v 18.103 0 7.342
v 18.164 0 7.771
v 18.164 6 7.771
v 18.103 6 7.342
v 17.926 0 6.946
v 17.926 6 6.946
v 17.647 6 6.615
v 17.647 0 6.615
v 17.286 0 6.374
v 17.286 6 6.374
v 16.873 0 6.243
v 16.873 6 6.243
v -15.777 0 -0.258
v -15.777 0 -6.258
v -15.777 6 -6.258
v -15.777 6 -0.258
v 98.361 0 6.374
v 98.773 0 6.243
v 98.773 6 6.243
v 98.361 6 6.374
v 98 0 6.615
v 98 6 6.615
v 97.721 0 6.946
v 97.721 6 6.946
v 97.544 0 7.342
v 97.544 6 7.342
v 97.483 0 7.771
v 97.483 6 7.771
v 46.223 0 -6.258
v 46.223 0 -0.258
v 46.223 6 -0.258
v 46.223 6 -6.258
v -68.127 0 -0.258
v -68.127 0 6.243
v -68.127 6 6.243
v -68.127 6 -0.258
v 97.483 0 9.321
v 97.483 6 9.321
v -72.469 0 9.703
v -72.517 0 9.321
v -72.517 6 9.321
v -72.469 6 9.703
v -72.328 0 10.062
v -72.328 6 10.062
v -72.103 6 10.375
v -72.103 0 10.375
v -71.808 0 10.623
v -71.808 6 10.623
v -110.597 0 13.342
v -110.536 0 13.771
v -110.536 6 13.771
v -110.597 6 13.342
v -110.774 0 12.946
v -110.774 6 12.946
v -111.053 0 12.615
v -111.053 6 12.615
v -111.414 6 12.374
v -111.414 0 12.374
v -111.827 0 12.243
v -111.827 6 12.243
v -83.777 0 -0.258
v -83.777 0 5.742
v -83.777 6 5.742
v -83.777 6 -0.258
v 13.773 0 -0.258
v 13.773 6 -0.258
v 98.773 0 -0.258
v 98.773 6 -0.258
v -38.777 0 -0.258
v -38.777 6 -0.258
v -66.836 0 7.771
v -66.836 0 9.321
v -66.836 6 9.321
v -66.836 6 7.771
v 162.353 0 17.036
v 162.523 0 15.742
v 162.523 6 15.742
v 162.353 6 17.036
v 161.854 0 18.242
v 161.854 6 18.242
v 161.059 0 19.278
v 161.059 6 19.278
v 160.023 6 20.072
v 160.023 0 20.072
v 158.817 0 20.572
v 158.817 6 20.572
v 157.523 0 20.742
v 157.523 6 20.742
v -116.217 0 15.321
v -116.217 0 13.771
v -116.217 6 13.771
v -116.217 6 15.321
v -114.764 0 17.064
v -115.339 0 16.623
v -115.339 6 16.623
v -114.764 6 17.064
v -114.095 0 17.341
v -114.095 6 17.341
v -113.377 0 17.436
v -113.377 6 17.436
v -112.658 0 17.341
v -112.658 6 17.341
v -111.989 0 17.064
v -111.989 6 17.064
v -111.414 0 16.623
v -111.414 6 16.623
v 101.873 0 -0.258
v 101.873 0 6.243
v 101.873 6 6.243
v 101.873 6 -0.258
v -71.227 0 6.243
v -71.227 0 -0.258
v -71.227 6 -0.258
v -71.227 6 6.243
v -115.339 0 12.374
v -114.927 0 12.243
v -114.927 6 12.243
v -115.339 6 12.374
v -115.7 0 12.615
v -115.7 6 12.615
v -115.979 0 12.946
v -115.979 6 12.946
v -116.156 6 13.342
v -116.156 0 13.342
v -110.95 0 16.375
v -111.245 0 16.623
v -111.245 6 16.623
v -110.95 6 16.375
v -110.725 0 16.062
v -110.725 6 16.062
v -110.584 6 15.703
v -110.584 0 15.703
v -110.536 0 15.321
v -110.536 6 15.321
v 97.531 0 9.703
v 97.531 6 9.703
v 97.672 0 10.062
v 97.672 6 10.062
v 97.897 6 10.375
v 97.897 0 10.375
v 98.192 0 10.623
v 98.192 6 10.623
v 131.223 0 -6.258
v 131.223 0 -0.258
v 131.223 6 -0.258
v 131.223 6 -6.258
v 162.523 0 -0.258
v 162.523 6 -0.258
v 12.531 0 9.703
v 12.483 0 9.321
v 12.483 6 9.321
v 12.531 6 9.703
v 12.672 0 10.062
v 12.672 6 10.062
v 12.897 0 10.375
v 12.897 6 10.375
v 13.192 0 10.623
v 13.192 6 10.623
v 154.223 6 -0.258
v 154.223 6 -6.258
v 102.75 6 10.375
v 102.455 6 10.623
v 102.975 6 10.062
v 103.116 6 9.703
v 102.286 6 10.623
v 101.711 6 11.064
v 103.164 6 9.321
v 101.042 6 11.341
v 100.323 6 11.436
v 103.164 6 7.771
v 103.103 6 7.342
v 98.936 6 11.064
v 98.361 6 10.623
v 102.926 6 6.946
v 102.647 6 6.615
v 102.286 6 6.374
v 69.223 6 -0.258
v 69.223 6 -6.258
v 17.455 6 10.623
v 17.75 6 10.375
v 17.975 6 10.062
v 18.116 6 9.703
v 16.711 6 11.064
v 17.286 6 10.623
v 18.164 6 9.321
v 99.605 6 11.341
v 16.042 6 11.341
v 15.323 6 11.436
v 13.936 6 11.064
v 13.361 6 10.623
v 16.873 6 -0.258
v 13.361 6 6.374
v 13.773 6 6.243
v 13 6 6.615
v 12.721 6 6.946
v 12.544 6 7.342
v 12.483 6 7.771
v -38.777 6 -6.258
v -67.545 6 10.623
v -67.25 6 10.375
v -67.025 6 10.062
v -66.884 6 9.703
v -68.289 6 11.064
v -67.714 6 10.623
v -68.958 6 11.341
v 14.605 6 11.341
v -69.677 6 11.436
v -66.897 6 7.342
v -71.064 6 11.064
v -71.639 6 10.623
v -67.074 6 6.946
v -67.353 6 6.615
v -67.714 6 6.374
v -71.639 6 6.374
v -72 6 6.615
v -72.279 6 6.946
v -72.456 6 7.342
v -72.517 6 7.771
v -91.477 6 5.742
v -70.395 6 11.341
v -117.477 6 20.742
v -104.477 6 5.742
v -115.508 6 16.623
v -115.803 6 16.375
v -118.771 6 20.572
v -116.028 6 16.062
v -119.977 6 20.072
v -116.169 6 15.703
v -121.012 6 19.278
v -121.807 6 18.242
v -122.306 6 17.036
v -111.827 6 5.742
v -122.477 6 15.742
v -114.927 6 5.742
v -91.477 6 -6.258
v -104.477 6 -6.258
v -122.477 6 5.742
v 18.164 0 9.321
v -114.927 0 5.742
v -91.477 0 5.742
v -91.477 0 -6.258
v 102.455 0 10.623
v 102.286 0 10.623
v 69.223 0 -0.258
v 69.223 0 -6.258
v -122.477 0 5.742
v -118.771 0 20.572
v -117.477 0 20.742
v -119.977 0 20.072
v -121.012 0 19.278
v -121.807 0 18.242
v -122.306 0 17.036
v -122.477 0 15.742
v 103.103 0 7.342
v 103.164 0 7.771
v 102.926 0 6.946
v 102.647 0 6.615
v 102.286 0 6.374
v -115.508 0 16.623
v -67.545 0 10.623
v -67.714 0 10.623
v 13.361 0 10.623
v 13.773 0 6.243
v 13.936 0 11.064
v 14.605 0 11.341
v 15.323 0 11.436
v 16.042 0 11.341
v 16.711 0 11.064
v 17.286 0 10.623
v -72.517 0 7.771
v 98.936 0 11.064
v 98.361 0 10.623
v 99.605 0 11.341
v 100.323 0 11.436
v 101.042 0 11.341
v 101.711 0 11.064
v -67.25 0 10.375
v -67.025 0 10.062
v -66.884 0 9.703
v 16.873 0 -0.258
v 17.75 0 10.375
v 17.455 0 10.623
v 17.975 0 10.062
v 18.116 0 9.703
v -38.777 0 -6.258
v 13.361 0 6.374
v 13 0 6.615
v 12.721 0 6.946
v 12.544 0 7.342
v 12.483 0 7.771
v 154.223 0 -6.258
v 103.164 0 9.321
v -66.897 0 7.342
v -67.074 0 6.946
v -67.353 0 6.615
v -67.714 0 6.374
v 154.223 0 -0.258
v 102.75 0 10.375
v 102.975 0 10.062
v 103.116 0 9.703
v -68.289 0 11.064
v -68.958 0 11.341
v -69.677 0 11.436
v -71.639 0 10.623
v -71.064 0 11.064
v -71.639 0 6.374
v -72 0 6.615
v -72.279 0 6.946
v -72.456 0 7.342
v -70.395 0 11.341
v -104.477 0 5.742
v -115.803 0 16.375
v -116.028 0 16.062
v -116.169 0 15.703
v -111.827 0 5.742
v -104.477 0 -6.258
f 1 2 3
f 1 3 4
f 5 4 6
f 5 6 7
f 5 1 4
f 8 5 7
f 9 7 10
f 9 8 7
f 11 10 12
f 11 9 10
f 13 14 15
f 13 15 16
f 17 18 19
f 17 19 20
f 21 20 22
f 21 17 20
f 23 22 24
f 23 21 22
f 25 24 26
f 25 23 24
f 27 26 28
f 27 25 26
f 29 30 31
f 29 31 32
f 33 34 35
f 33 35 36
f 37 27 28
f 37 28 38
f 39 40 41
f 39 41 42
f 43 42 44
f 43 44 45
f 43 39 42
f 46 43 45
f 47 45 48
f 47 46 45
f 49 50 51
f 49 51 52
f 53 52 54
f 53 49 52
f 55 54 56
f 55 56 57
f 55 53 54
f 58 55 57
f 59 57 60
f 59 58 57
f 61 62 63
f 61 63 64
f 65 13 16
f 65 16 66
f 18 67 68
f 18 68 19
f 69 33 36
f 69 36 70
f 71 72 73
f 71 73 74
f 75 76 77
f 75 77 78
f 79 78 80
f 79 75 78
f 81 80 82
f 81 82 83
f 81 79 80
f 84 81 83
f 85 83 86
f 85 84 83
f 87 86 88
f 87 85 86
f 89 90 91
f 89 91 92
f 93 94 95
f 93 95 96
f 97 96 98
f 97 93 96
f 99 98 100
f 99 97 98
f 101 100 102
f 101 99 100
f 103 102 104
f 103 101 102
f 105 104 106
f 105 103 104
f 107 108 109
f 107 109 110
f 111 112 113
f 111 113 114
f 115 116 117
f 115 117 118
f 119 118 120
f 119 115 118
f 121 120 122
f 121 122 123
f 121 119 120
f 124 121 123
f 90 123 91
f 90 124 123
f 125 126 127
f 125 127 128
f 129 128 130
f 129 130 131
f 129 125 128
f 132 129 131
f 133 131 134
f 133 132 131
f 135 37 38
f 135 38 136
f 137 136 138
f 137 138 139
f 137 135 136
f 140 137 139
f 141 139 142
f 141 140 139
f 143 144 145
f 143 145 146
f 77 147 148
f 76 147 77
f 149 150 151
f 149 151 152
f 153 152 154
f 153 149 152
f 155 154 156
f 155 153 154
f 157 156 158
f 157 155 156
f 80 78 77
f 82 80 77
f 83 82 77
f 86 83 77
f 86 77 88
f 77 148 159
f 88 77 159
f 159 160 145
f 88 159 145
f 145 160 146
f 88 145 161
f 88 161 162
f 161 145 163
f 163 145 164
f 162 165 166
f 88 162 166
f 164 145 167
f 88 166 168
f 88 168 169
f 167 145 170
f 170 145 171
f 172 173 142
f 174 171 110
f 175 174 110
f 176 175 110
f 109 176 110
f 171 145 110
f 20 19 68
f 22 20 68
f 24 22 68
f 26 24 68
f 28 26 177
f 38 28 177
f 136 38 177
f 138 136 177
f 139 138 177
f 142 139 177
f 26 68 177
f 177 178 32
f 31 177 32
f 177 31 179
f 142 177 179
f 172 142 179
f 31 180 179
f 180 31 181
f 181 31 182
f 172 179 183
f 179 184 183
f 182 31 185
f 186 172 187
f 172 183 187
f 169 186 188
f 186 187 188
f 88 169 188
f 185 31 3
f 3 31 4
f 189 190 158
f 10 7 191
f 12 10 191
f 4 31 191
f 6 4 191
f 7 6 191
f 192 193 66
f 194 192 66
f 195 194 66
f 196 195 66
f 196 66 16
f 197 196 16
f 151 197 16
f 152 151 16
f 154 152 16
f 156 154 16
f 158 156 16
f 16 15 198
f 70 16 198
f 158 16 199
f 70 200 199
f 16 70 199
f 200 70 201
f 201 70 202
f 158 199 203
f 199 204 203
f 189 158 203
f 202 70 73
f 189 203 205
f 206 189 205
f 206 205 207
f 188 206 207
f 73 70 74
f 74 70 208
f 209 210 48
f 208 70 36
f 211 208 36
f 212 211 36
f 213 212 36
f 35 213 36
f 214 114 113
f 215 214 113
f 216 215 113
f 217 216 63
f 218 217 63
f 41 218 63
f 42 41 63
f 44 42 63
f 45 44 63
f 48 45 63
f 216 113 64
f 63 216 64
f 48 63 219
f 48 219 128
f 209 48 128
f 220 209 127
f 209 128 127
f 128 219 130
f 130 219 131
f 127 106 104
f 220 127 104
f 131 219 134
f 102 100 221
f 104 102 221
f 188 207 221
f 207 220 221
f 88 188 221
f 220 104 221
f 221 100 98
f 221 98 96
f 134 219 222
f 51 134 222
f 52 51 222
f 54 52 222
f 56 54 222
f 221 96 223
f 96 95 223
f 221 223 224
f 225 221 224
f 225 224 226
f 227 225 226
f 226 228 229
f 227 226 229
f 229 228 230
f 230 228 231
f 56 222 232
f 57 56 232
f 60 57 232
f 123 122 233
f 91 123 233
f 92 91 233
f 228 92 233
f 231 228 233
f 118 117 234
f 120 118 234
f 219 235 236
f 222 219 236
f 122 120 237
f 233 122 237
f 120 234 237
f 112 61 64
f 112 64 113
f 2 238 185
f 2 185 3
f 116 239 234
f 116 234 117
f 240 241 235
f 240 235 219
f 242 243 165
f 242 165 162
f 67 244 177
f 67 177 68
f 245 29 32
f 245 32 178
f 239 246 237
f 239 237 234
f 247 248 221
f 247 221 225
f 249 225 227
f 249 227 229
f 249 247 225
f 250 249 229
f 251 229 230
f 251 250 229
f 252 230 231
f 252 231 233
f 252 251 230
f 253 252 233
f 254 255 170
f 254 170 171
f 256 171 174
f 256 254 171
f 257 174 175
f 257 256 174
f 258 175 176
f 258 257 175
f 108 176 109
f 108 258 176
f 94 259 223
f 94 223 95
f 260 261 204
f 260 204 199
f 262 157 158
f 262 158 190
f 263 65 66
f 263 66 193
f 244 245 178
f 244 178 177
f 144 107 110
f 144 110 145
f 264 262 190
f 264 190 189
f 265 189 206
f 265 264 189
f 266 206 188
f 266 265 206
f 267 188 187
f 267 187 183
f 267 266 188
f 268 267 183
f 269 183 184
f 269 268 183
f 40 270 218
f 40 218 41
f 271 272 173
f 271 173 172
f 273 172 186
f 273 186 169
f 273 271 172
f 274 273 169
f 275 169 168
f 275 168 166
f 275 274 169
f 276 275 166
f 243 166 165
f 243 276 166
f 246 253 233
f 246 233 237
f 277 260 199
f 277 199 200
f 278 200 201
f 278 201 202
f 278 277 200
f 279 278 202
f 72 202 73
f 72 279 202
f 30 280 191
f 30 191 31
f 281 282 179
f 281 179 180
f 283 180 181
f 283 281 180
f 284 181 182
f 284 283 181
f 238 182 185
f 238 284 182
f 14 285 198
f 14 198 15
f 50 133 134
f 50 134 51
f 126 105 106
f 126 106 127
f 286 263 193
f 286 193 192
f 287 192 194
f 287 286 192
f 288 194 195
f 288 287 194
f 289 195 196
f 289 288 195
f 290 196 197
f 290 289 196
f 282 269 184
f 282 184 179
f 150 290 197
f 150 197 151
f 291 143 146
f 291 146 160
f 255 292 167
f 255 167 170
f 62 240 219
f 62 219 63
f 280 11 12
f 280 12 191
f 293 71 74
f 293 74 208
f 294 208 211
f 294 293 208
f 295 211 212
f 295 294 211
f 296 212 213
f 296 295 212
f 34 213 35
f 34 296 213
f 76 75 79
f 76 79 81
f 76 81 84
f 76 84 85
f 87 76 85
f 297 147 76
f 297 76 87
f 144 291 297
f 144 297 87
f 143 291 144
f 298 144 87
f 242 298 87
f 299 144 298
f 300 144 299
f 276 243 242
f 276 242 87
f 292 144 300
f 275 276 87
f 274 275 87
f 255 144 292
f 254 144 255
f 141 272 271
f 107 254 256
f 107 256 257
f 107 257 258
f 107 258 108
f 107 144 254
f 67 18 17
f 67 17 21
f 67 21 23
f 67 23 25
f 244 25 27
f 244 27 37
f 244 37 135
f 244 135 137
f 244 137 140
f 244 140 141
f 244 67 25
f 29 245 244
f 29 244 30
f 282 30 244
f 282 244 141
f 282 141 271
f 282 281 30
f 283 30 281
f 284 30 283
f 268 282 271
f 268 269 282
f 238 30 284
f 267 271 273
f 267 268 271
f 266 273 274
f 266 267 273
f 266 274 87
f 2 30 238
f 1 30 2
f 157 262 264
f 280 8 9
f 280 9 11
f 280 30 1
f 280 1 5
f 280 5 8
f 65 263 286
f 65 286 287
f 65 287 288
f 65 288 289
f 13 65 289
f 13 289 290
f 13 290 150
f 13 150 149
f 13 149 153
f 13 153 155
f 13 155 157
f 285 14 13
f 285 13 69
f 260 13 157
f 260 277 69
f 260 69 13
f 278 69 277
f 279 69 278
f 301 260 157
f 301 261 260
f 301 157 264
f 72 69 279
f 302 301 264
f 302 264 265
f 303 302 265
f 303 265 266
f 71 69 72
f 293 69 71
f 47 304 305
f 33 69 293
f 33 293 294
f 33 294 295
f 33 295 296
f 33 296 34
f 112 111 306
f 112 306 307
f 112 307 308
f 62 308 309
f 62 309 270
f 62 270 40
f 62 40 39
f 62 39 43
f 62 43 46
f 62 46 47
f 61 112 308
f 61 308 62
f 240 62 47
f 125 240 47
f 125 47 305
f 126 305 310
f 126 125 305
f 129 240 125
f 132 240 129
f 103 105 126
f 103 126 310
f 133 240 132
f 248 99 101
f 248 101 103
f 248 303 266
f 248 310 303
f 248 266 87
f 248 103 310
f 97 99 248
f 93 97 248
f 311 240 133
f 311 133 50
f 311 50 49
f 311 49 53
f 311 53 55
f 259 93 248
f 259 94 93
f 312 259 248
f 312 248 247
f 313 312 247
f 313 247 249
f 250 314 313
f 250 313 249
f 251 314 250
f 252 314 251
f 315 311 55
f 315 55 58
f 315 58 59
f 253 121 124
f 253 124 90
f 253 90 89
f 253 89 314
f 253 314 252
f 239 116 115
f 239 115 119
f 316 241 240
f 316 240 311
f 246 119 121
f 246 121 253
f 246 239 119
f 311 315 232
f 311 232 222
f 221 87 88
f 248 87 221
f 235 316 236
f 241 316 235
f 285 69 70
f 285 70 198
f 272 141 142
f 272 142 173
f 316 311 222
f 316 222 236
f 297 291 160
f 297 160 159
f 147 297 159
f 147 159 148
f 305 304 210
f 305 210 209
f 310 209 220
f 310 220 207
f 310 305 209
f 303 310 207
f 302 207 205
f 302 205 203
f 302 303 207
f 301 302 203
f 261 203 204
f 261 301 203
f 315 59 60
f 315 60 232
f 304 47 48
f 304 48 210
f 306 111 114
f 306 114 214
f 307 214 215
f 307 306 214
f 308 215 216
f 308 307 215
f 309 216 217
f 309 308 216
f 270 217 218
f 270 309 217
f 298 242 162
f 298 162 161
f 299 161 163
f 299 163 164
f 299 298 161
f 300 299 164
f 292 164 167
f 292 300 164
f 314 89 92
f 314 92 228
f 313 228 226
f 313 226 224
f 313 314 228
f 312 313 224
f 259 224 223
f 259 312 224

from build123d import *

# Parameters (mm, degrees)
SALIENTE_EXTRUIR1_DEPTH = 6


with BuildPart() as part:
    # Croquis1 → Saliente-Extruir1 (new body)
    with BuildSketch(Plane(origin=(0, 0, 0), x_dir=(1, 0, 0), z_dir=(0, 1, 0))):
        with BuildLine():
            Line((-122.476621199, -5.742358079), (-114.926621199, -5.742358079))
            Line((-114.926621199, -5.742358079), (-114.926621199, -12.242583321))
            ThreePointArc((-114.926621199, -12.242583321), (-115.851225833, -12.770672857), (-116.216958829, -13.770678689))
            Line((-116.216958829, -13.770678689), (-116.216958829, -15.320678689))
            ThreePointArc((-116.216958829, -15.320678689), (-116.028261999, -16.061862661), (-115.508115372, -16.622583321))
            Line((-115.508115372, -16.622583321), (-115.33887044, -16.622583321))
            ThreePointArc((-115.33887044, -16.622583321), (-113.376621199, -17.435593306), (-111.414371957, -16.622583321))
            Line((-111.414371957, -16.622583321), (-111.245127025, -16.622583321))
            ThreePointArc((-111.245127025, -16.622583321), (-110.724980398, -16.061862661), (-110.536283568, -15.320678689))
            Line((-110.536283568, -15.320678689), (-110.536283568, -13.770678689))
            ThreePointArc((-110.536283568, -13.770678689), (-110.902016564, -12.770672857), (-111.826621199, -12.242583321))
            Line((-111.826621199, -12.242583321), (-111.826621199, -5.742358079))
            Line((-111.826621199, -5.742358079), (-104.476621199, -5.742358079))
            Line((-104.476621199, -5.742358079), (-104.476621199, 6.257641921))
            Line((-104.476621199, 6.257641921), (-91.476621199, 6.257641921))
            Line((-91.476621199, 6.257641921), (-91.476621199, -5.742358079))
            Line((-91.476621199, -5.742358079), (-83.776621199, -5.742358079))
            Line((-83.776621199, -5.742358079), (-83.776621199, 0.257641921))
            Line((-83.776621199, 0.257641921), (-71.226621199, 0.257641921))
            Line((-71.226621199, 0.257641921), (-71.226621199, -6.242583321))
            ThreePointArc((-71.226621199, -6.242583321), (-72.151225833, -6.770672857), (-72.516958829, -7.770678689))
            Line((-72.516958829, -7.770678689), (-72.516958829, -9.320678689))
            ThreePointArc((-72.516958829, -9.320678689), (-72.328261999, -10.061862661), (-71.808115372, -10.622583321))
            Line((-71.808115372, -10.622583321), (-71.63887044, -10.622583321))
            ThreePointArc((-71.63887044, -10.622583321), (-69.676621199, -11.435593306), (-67.714371957, -10.622583321))
            Line((-67.714371957, -10.622583321), (-67.545127025, -10.622583321))
            ThreePointArc((-67.545127025, -10.622583321), (-67.024980398, -10.061862661), (-66.836283568, -9.320678689))
            Line((-66.836283568, -9.320678689), (-66.836283568, -7.770678689))
            ThreePointArc((-66.836283568, -7.770678689), (-67.202016564, -6.770672857), (-68.126621199, -6.242583321))
            Line((-68.126621199, -6.242583321), (-68.126621199, 0.257641921))
            Line((-68.126621199, 0.257641921), (-38.776621199, 0.257641921))
            Line((-38.776621199, 0.257641921), (-38.776621199, 6.257641921))
            Line((-38.776621199, 6.257641921), (-15.776621199, 6.257641921))
            Line((-15.776621199, 6.257641921), (-15.776621199, 0.257641921))
            Line((-15.776621199, 0.257641921), (13.773378801, 0.257641921))
            Line((13.773378801, 0.257641921), (13.773378801, -6.242583321))
            ThreePointArc((13.773378801, -6.242583321), (12.848774167, -6.770672857), (12.483041171, -7.770678689))
            Line((12.483041171, -7.770678689), (12.483041171, -9.320678689))
            ThreePointArc((12.483041171, -9.320678689), (12.671738001, -10.061862661), (13.191884628, -10.622583321))
            Line((13.191884628, -10.622583321), (13.36112956, -10.622583321))
            ThreePointArc((13.36112956, -10.622583321), (15.323378801, -11.435593306), (17.285628043, -10.622583321))
            Line((17.285628043, -10.622583321), (17.454872975, -10.622583321))
            ThreePointArc((17.454872975, -10.622583321), (17.975019602, -10.061862661), (18.163716432, -9.320678689))
            Line((18.163716432, -9.320678689), (18.163716432, -7.770678689))
            ThreePointArc((18.163716432, -7.770678689), (17.797983436, -6.770672857), (16.873378801, -6.242583321))
            Line((16.873378801, -6.242583321), (16.873378801, 0.257641921))
            Line((16.873378801, 0.257641921), (46.223378801, 0.257641921))
            Line((46.223378801, 0.257641921), (46.223378801, 6.257641921))
            Line((46.223378801, 6.257641921), (69.223378801, 6.257641921))
            Line((69.223378801, 6.257641921), (69.223378801, 0.257641921))
            Line((69.223378801, 0.257641921), (98.773378801, 0.257641921))
            Line((98.773378801, 0.257641921), (98.773378801, -6.242583321))
            ThreePointArc((98.773378801, -6.242583321), (97.848774167, -6.770672857), (97.483041171, -7.770678689))
            Line((97.483041171, -7.770678689), (97.483041171, -9.320678689))
            ThreePointArc((97.483041171, -9.320678689), (97.671738001, -10.061862661), (98.191884628, -10.622583321))
            Line((98.191884628, -10.622583321), (98.36112956, -10.622583321))
            ThreePointArc((98.36112956, -10.622583321), (100.323378801, -11.435593306), (102.285628043, -10.622583321))
            Line((102.285628043, -10.622583321), (102.454872975, -10.622583321))
            ThreePointArc((102.454872975, -10.622583321), (102.975019602, -10.061862661), (103.163716432, -9.320678689))
            Line((103.163716432, -9.320678689), (103.163716432, -7.770678689))
            ThreePointArc((103.163716432, -7.770678689), (102.797983436, -6.770672857), (101.873378801, -6.242583321))
            Line((101.873378801, -6.242583321), (101.873378801, 0.257641921))
            Line((101.873378801, 0.257641921), (131.223378801, 0.257641921))
            Line((131.223378801, 0.257641921), (131.223378801, 6.257641921))
            Line((131.223378801, 6.257641921), (154.223378801, 6.257641921))
            Line((154.223378801, 6.257641921), (154.223378801, 0.257641921))
            Line((154.223378801, 0.257641921), (162.523378801, 0.257641921))
            Line((162.523378801, 0.257641921), (162.523378801, -0.742358079))
            Line((162.523378801, -0.742358079), (162.523378801, -15.742358079))
            ThreePointArc((162.523378801, -15.742358079), (161.058912707, -19.277891985), (157.523378801, -20.742358079))
            Line((157.523378801, -20.742358079), (-117.476621199, -20.742358079))
            ThreePointArc((-117.476621199, -20.742358079), (-121.012155104, -19.277891985), (-122.476621199, -15.742358079))
            Line((-122.476621199, -15.742358079), (-122.476621199, -5.742358079))
        make_face()
    extrude(amount=SALIENTE_EXTRUIR1_DEPTH)


solid = part.part
